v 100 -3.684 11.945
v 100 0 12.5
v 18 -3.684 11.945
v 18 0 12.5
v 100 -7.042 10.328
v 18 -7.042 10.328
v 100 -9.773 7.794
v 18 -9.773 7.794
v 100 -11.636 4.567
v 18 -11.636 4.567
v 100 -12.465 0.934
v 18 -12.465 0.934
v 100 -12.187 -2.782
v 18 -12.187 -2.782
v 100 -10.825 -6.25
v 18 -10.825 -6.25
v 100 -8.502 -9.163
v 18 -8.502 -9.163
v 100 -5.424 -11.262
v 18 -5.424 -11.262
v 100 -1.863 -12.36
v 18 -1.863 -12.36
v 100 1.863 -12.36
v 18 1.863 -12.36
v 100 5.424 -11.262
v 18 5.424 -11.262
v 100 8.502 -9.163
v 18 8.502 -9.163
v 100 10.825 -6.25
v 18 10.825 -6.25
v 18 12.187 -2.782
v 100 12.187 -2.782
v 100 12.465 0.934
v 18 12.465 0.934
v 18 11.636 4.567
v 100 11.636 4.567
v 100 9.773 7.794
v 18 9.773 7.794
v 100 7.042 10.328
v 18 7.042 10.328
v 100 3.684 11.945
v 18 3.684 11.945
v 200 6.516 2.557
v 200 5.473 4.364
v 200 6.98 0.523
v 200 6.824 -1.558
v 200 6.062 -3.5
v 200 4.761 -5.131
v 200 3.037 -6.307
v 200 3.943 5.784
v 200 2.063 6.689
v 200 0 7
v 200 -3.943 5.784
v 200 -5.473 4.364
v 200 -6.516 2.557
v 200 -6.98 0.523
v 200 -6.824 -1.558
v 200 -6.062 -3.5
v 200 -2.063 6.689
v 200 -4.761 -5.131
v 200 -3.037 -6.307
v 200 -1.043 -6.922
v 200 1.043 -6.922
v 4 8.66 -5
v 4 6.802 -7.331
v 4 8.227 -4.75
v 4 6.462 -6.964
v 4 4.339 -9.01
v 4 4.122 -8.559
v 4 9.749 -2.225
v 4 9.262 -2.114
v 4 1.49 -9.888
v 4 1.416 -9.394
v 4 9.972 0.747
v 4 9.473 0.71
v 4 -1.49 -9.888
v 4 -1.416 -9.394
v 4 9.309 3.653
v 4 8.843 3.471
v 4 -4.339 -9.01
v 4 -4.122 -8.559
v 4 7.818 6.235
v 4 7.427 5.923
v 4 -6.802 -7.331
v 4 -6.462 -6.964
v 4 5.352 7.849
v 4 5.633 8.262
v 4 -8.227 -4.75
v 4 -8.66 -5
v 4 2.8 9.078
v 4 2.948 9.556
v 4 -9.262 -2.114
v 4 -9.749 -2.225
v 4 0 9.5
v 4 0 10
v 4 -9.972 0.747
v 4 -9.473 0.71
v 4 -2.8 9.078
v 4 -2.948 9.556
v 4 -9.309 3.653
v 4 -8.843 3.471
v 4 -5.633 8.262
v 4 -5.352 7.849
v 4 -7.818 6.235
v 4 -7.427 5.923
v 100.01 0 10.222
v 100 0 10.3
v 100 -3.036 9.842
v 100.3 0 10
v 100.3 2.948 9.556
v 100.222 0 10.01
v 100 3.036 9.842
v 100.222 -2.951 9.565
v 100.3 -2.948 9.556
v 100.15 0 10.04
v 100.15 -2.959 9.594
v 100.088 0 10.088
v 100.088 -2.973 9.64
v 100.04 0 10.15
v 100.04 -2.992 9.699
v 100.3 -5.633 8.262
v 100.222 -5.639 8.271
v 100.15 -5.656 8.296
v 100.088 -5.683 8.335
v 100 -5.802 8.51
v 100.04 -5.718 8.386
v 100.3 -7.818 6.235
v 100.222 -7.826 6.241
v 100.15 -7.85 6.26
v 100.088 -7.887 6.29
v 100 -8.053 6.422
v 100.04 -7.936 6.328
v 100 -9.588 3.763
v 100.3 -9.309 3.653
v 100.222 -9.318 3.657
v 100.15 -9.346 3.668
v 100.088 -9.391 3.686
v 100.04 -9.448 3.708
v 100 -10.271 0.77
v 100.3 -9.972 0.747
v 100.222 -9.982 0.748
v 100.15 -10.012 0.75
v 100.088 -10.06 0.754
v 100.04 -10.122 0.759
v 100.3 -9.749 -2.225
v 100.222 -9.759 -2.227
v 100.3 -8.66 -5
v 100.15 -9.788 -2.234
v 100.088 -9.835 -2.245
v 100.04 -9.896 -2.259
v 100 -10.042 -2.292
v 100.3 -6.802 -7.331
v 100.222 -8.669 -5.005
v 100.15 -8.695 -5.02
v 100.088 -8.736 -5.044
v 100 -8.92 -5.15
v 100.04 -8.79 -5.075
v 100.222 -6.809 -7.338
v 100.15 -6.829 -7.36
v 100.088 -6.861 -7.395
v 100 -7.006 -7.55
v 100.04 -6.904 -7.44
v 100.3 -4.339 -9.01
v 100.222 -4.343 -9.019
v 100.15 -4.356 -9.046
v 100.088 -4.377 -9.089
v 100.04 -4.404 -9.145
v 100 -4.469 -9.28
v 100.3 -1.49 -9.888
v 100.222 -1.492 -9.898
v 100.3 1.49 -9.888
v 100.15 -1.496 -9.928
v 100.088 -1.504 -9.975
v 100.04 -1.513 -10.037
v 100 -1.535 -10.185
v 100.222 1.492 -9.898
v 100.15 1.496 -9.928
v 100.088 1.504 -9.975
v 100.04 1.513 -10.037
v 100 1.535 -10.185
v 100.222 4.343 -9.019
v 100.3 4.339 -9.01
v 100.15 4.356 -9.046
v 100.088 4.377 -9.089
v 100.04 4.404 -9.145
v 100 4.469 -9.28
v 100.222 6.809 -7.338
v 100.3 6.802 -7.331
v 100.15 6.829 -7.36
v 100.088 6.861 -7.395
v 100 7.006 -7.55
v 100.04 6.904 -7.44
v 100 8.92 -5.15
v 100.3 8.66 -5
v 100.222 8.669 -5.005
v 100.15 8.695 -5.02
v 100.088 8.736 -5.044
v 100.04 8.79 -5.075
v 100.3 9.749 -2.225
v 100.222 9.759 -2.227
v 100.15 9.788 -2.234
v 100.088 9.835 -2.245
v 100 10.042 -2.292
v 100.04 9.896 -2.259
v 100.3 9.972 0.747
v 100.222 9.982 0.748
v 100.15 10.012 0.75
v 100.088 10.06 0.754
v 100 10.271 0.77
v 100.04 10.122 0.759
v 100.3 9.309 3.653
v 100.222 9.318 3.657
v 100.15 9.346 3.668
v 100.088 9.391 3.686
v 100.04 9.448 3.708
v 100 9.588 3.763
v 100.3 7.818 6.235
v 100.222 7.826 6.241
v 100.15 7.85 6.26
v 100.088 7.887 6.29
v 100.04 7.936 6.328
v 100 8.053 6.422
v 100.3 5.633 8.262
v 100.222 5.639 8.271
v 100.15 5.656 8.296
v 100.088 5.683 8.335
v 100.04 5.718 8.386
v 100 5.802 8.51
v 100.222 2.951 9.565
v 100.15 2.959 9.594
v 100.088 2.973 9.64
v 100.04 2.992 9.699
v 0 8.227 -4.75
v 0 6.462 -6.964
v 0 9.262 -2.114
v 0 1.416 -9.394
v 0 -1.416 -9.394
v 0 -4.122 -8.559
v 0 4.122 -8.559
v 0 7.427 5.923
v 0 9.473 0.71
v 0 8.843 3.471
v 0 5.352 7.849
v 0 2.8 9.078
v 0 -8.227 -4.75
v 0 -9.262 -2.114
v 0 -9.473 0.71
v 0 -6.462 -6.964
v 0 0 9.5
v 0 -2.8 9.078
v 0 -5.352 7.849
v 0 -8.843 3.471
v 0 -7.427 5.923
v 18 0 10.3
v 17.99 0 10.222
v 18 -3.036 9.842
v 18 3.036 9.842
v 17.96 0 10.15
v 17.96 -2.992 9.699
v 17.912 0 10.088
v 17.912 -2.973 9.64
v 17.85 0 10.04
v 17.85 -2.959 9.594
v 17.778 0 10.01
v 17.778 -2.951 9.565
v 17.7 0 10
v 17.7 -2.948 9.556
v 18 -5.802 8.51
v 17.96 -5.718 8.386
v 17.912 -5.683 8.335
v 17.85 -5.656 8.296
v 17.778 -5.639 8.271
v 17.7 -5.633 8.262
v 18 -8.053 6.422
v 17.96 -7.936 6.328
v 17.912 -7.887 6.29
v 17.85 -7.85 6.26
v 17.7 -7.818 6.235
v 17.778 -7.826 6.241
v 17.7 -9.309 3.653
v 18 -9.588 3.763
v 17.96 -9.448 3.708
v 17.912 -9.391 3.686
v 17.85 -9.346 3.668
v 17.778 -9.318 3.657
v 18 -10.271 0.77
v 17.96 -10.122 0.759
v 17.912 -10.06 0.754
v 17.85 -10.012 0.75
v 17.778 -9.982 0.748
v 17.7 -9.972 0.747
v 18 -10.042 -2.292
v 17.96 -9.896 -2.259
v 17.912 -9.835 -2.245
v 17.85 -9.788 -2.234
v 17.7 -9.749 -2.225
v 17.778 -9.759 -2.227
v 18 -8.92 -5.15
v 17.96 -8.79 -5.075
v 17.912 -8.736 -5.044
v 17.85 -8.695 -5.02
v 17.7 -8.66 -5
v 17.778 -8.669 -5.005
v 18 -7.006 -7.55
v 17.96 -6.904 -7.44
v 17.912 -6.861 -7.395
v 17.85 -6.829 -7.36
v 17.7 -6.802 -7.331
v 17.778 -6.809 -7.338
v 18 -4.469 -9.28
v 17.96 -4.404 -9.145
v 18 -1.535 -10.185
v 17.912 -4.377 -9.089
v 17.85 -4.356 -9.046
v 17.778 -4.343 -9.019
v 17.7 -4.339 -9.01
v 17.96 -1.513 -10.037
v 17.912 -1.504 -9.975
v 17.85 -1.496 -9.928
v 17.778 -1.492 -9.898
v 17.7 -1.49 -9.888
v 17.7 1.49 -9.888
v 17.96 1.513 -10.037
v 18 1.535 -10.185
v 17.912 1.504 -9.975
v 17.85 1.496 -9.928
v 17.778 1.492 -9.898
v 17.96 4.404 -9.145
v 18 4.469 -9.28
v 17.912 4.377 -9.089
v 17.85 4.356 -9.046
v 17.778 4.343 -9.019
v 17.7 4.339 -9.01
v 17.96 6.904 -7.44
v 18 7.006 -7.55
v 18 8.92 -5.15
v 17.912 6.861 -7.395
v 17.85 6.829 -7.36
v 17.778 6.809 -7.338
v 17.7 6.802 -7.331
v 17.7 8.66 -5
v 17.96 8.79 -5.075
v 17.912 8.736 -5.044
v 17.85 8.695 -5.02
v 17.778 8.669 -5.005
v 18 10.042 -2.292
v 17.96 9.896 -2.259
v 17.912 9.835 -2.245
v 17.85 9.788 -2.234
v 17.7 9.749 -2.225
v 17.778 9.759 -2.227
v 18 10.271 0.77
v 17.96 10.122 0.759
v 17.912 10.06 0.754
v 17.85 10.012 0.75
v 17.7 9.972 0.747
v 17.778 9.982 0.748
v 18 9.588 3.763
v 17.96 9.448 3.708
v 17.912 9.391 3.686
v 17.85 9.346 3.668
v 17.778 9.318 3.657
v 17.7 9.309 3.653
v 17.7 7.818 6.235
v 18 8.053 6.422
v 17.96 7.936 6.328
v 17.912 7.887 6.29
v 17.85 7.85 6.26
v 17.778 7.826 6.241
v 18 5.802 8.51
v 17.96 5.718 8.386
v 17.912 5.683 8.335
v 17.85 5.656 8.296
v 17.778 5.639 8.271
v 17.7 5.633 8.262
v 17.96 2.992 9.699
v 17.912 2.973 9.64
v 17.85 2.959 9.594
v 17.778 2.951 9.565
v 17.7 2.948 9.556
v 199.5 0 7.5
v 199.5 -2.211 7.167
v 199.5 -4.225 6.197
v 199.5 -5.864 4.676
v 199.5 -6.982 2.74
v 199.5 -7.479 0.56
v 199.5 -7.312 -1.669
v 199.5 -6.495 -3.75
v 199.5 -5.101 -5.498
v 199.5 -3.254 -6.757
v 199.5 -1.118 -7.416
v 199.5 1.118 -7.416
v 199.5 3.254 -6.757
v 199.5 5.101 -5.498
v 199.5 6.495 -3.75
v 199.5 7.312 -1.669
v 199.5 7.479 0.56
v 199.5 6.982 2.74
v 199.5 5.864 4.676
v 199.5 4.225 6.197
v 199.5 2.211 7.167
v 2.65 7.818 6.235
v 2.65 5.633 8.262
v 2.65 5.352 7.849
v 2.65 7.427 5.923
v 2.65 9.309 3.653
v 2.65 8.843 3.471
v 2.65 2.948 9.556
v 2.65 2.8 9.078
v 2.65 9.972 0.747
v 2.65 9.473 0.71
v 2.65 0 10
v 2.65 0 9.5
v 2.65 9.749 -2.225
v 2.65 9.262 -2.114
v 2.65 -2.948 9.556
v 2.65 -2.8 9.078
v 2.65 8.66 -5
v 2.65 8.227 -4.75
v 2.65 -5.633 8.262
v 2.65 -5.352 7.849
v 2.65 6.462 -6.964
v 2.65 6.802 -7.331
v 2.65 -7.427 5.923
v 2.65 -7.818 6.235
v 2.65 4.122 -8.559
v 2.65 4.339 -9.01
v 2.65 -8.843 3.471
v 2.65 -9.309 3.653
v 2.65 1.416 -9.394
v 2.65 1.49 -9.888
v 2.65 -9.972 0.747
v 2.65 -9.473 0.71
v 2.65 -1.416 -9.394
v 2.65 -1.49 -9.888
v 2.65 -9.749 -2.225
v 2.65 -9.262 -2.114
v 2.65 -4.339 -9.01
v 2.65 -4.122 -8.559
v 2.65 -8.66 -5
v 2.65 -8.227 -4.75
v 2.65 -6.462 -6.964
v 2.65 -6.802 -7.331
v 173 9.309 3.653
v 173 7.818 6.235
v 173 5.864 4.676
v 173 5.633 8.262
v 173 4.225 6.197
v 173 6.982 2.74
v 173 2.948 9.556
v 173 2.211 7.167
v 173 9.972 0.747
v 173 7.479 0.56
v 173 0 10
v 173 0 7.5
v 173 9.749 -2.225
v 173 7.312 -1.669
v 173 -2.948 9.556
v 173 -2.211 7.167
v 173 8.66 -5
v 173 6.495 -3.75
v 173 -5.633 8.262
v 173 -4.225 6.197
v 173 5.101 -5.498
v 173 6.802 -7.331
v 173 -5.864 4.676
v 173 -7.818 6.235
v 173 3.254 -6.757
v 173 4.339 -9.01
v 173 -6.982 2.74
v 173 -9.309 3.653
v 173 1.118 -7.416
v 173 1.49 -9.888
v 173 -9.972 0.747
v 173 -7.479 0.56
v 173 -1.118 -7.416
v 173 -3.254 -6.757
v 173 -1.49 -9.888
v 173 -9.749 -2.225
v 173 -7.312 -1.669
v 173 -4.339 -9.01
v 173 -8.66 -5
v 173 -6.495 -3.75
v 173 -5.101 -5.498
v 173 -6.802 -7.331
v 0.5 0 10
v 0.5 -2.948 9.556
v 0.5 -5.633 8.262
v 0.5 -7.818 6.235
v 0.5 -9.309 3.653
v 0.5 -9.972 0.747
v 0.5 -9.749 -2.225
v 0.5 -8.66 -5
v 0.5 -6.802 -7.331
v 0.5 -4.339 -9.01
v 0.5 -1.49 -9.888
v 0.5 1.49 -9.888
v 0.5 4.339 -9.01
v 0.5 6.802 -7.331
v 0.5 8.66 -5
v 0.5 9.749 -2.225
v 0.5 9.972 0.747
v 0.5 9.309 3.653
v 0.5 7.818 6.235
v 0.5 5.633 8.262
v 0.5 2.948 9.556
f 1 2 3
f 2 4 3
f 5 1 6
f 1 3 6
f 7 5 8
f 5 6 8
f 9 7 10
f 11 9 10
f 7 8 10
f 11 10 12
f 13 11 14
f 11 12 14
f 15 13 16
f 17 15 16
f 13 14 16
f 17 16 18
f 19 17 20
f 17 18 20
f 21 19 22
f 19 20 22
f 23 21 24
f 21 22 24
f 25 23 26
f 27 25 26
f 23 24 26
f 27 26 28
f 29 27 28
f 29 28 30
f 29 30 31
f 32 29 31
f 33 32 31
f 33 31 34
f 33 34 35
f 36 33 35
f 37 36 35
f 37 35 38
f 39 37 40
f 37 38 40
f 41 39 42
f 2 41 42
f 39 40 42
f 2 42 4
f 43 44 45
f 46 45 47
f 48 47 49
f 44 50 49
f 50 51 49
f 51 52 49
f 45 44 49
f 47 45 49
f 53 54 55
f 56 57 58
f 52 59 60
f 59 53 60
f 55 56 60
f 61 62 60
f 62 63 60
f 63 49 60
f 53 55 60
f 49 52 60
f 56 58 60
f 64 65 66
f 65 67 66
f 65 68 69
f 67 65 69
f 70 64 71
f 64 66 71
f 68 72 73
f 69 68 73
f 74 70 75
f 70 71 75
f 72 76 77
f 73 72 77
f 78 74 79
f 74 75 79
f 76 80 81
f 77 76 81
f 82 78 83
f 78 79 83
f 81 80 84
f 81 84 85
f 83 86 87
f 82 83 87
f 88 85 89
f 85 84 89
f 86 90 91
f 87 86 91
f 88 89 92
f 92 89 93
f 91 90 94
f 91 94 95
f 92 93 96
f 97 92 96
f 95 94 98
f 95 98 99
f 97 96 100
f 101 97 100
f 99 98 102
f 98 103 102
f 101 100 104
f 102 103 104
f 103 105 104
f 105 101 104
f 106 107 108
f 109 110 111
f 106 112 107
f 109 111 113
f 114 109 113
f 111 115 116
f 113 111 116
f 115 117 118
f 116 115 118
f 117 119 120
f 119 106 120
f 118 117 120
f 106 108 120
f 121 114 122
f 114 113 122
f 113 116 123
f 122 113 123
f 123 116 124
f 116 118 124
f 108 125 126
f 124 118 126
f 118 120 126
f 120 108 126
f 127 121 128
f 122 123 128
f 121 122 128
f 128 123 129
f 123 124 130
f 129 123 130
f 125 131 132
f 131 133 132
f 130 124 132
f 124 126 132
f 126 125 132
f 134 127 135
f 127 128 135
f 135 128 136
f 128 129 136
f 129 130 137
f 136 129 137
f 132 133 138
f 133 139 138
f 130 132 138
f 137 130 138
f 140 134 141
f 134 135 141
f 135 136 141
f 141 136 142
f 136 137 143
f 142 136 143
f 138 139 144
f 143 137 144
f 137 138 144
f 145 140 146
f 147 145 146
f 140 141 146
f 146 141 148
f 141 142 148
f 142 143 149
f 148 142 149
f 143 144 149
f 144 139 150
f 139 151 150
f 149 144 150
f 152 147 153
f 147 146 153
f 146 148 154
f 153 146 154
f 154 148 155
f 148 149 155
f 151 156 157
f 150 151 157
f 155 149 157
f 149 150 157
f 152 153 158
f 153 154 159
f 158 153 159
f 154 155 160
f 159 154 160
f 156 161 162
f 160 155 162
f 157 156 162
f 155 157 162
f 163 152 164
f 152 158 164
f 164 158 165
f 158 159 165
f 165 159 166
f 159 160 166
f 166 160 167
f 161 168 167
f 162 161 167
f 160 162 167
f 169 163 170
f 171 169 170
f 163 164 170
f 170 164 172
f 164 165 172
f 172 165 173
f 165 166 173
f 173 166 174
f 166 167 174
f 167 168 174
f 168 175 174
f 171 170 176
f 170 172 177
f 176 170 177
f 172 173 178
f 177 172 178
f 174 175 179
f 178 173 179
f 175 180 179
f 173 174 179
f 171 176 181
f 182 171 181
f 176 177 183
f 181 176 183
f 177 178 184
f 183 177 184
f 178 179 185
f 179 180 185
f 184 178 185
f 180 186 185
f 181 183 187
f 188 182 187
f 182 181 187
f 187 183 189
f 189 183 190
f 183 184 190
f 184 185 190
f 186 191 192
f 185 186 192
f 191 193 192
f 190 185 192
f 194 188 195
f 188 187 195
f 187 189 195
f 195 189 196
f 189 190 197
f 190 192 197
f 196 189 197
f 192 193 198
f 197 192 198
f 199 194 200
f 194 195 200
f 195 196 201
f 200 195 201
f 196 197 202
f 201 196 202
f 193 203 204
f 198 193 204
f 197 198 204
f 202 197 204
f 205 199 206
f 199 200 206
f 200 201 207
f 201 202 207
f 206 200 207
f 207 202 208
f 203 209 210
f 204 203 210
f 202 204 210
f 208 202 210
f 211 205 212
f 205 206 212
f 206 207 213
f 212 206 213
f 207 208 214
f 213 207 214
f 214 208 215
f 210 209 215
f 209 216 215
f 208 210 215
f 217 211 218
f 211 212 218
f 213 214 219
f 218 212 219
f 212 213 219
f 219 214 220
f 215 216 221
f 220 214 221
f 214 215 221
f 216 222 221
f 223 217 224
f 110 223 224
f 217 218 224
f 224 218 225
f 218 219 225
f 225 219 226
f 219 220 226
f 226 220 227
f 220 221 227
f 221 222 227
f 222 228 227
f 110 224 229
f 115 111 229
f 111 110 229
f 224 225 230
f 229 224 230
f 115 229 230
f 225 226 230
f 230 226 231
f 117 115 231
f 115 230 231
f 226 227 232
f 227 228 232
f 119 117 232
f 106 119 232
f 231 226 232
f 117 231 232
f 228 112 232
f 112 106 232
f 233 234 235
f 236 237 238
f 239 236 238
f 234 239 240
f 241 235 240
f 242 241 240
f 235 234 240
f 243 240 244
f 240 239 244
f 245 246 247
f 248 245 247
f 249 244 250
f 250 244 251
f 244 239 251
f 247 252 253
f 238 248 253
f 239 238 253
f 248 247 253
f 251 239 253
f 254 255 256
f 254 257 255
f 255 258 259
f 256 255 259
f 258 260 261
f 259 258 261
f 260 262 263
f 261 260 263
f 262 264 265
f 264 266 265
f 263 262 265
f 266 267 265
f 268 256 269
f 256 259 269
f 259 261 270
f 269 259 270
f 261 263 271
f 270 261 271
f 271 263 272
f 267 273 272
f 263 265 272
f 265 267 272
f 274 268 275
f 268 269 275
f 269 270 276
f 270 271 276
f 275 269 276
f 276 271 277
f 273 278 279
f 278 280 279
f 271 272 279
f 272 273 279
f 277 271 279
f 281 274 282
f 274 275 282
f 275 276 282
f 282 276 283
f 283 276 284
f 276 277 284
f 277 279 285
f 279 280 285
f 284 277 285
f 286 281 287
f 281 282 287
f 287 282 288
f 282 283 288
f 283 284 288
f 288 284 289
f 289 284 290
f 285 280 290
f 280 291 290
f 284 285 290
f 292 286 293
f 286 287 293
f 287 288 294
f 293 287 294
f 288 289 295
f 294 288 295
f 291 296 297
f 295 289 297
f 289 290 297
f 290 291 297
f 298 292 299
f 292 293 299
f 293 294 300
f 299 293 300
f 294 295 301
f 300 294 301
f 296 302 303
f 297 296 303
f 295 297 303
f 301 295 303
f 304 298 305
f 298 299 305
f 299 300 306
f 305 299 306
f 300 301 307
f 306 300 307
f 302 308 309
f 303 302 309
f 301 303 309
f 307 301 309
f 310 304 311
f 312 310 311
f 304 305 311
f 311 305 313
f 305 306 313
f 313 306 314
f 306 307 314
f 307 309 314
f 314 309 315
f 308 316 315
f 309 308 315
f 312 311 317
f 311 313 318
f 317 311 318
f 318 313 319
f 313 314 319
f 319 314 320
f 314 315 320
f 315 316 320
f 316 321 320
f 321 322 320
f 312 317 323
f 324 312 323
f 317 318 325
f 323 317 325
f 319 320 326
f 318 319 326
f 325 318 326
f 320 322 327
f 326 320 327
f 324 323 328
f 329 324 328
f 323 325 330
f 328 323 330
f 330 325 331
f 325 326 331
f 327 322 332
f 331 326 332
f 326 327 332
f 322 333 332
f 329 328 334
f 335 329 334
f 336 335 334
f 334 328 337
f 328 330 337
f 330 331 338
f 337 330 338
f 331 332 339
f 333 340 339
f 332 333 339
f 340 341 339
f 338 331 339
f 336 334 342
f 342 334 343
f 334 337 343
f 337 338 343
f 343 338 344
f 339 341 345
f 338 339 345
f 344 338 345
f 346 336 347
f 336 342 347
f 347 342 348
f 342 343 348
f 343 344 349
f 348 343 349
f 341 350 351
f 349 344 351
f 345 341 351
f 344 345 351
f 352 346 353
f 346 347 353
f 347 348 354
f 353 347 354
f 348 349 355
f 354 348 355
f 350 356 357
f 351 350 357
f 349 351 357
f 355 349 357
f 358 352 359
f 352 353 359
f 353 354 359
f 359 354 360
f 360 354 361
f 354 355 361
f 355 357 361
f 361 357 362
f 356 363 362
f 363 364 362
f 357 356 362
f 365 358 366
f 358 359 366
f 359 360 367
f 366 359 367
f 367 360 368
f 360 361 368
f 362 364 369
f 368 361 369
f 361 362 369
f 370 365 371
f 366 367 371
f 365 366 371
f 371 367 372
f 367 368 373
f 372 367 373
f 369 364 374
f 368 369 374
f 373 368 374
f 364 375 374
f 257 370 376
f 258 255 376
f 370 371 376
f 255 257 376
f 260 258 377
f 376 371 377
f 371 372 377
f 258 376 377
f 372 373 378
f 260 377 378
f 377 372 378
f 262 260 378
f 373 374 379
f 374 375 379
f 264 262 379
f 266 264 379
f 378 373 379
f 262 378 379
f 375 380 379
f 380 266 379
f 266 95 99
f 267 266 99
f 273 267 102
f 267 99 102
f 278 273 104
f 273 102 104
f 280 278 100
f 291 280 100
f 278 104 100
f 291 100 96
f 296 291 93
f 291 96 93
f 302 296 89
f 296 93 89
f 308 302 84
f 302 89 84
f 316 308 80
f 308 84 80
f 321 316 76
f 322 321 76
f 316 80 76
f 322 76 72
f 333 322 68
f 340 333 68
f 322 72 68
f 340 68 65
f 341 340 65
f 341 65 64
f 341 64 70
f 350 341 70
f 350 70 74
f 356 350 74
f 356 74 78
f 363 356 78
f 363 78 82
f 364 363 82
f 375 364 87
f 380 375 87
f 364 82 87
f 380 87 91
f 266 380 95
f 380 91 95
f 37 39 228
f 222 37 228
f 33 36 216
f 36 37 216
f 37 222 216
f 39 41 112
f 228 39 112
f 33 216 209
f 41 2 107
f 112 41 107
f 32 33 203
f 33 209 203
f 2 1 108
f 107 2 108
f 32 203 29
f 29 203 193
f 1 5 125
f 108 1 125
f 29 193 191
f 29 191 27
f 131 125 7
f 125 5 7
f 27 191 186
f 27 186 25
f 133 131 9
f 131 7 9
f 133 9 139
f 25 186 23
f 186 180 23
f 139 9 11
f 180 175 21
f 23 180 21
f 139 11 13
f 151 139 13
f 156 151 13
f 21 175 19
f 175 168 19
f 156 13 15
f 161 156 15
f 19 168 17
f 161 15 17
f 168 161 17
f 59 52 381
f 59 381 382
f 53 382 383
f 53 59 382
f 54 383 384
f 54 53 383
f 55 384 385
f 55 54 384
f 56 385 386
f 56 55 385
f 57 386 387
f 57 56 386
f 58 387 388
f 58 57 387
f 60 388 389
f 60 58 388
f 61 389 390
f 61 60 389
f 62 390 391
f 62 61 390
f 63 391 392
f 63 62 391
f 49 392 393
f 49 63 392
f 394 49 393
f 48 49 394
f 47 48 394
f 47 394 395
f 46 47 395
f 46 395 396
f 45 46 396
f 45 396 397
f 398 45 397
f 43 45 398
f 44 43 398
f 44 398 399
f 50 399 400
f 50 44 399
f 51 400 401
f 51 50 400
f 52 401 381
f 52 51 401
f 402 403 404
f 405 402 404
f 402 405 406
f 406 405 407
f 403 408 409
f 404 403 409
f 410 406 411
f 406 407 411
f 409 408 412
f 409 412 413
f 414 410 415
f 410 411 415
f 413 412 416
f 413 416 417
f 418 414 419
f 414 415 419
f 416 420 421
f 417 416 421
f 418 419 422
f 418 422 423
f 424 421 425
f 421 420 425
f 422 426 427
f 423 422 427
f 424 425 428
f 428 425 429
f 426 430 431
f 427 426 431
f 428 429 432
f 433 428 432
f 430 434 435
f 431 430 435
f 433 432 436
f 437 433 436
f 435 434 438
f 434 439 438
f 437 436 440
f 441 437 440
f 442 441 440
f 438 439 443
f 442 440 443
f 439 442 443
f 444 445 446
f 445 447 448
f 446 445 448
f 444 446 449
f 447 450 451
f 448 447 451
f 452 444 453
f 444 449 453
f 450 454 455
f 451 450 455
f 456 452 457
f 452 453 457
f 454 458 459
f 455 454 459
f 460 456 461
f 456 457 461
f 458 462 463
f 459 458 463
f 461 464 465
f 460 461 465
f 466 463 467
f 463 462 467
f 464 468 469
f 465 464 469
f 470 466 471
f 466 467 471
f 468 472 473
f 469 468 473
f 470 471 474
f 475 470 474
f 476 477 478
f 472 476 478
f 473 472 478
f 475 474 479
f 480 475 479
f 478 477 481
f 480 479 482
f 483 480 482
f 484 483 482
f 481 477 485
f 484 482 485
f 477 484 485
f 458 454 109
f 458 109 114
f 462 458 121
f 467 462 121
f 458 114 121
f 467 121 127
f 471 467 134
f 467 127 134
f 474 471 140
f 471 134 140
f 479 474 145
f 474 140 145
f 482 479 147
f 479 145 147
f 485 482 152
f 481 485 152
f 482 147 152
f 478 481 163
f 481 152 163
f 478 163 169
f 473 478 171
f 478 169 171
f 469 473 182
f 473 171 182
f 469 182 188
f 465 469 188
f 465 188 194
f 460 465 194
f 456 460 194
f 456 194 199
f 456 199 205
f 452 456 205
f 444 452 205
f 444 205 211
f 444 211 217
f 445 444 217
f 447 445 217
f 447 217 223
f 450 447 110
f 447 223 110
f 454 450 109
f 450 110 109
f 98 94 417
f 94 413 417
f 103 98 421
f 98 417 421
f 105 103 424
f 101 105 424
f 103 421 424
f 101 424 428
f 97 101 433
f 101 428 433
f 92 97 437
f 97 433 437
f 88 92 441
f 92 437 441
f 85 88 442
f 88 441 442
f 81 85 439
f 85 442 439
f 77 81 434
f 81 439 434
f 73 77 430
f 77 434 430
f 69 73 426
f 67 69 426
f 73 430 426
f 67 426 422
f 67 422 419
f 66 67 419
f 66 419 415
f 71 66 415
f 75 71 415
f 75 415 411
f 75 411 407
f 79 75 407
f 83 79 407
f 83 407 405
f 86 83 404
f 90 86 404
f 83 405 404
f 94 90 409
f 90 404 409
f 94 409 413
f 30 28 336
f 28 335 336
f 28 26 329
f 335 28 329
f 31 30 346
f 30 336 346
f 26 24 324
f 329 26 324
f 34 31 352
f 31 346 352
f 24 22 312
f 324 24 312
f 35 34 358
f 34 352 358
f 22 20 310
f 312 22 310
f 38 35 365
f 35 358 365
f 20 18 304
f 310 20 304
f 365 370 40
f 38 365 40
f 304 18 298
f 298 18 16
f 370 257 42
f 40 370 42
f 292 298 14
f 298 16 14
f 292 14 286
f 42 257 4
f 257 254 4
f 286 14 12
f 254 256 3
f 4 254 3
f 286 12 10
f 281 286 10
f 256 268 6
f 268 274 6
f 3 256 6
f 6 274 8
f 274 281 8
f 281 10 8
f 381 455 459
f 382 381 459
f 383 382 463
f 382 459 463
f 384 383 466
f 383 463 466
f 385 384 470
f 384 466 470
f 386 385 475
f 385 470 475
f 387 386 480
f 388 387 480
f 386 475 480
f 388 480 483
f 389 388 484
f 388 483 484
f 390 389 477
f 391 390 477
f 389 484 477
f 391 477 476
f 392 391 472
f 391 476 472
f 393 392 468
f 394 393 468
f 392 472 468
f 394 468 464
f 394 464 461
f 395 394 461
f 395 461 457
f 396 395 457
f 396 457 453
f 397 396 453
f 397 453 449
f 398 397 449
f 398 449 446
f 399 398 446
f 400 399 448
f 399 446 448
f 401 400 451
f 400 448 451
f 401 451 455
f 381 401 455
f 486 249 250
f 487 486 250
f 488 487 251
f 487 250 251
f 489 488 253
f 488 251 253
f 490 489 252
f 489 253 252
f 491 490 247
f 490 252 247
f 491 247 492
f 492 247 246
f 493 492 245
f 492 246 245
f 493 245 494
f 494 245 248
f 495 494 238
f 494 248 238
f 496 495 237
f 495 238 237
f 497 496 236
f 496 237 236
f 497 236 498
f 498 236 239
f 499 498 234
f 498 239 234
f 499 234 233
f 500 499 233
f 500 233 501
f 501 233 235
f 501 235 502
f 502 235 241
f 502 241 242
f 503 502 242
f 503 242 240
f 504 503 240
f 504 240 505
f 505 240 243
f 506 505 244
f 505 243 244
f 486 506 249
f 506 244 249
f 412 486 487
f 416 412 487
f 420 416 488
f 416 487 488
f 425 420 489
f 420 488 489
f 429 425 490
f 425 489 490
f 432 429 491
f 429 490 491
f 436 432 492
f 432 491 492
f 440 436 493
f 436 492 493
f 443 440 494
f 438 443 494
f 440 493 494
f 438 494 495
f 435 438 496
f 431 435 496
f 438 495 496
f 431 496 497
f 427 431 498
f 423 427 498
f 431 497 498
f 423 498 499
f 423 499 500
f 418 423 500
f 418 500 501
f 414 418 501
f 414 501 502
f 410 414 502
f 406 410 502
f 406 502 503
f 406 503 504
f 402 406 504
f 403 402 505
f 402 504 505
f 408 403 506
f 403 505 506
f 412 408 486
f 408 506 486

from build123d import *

# Parameters (mm, degrees)
FILLET1_R     = 0.3
CHAMFER1_SIZE = 0.5


with BuildPart() as part:
    # Sketch1 → Revolve1 (revolve)
    with BuildSketch(Plane.XY):
        Polygon((0, 0), (200, 0), (200, 7.5), (173, 7.5), (173, 10), (100, 10), (100, 12.5), (18, 12.5), (18, 10), (4, 10), (4, 9.5), (2.65, 9.5), (2.65, 10), (0, 10), align=None)
    revolve(axis=Axis((0, 0, 0), (1, 0, 0)))

    # Fillet1
    fillet1_edges = [part.edges().sort_by_distance(p)[0] for p in [
        (100, -10, 0),
        (18, -10, 0),
    ]]
    fillet(fillet1_edges, radius=FILLET1_R)

    # Chamfer1
    chamfer1_edges = [part.edges().sort_by_distance(p)[0] for p in [
        (0, -10, 0),
        (200, -7.5, 0),
    ]]
    chamfer(chamfer1_edges, length=CHAMFER1_SIZE)


solid = part.part
